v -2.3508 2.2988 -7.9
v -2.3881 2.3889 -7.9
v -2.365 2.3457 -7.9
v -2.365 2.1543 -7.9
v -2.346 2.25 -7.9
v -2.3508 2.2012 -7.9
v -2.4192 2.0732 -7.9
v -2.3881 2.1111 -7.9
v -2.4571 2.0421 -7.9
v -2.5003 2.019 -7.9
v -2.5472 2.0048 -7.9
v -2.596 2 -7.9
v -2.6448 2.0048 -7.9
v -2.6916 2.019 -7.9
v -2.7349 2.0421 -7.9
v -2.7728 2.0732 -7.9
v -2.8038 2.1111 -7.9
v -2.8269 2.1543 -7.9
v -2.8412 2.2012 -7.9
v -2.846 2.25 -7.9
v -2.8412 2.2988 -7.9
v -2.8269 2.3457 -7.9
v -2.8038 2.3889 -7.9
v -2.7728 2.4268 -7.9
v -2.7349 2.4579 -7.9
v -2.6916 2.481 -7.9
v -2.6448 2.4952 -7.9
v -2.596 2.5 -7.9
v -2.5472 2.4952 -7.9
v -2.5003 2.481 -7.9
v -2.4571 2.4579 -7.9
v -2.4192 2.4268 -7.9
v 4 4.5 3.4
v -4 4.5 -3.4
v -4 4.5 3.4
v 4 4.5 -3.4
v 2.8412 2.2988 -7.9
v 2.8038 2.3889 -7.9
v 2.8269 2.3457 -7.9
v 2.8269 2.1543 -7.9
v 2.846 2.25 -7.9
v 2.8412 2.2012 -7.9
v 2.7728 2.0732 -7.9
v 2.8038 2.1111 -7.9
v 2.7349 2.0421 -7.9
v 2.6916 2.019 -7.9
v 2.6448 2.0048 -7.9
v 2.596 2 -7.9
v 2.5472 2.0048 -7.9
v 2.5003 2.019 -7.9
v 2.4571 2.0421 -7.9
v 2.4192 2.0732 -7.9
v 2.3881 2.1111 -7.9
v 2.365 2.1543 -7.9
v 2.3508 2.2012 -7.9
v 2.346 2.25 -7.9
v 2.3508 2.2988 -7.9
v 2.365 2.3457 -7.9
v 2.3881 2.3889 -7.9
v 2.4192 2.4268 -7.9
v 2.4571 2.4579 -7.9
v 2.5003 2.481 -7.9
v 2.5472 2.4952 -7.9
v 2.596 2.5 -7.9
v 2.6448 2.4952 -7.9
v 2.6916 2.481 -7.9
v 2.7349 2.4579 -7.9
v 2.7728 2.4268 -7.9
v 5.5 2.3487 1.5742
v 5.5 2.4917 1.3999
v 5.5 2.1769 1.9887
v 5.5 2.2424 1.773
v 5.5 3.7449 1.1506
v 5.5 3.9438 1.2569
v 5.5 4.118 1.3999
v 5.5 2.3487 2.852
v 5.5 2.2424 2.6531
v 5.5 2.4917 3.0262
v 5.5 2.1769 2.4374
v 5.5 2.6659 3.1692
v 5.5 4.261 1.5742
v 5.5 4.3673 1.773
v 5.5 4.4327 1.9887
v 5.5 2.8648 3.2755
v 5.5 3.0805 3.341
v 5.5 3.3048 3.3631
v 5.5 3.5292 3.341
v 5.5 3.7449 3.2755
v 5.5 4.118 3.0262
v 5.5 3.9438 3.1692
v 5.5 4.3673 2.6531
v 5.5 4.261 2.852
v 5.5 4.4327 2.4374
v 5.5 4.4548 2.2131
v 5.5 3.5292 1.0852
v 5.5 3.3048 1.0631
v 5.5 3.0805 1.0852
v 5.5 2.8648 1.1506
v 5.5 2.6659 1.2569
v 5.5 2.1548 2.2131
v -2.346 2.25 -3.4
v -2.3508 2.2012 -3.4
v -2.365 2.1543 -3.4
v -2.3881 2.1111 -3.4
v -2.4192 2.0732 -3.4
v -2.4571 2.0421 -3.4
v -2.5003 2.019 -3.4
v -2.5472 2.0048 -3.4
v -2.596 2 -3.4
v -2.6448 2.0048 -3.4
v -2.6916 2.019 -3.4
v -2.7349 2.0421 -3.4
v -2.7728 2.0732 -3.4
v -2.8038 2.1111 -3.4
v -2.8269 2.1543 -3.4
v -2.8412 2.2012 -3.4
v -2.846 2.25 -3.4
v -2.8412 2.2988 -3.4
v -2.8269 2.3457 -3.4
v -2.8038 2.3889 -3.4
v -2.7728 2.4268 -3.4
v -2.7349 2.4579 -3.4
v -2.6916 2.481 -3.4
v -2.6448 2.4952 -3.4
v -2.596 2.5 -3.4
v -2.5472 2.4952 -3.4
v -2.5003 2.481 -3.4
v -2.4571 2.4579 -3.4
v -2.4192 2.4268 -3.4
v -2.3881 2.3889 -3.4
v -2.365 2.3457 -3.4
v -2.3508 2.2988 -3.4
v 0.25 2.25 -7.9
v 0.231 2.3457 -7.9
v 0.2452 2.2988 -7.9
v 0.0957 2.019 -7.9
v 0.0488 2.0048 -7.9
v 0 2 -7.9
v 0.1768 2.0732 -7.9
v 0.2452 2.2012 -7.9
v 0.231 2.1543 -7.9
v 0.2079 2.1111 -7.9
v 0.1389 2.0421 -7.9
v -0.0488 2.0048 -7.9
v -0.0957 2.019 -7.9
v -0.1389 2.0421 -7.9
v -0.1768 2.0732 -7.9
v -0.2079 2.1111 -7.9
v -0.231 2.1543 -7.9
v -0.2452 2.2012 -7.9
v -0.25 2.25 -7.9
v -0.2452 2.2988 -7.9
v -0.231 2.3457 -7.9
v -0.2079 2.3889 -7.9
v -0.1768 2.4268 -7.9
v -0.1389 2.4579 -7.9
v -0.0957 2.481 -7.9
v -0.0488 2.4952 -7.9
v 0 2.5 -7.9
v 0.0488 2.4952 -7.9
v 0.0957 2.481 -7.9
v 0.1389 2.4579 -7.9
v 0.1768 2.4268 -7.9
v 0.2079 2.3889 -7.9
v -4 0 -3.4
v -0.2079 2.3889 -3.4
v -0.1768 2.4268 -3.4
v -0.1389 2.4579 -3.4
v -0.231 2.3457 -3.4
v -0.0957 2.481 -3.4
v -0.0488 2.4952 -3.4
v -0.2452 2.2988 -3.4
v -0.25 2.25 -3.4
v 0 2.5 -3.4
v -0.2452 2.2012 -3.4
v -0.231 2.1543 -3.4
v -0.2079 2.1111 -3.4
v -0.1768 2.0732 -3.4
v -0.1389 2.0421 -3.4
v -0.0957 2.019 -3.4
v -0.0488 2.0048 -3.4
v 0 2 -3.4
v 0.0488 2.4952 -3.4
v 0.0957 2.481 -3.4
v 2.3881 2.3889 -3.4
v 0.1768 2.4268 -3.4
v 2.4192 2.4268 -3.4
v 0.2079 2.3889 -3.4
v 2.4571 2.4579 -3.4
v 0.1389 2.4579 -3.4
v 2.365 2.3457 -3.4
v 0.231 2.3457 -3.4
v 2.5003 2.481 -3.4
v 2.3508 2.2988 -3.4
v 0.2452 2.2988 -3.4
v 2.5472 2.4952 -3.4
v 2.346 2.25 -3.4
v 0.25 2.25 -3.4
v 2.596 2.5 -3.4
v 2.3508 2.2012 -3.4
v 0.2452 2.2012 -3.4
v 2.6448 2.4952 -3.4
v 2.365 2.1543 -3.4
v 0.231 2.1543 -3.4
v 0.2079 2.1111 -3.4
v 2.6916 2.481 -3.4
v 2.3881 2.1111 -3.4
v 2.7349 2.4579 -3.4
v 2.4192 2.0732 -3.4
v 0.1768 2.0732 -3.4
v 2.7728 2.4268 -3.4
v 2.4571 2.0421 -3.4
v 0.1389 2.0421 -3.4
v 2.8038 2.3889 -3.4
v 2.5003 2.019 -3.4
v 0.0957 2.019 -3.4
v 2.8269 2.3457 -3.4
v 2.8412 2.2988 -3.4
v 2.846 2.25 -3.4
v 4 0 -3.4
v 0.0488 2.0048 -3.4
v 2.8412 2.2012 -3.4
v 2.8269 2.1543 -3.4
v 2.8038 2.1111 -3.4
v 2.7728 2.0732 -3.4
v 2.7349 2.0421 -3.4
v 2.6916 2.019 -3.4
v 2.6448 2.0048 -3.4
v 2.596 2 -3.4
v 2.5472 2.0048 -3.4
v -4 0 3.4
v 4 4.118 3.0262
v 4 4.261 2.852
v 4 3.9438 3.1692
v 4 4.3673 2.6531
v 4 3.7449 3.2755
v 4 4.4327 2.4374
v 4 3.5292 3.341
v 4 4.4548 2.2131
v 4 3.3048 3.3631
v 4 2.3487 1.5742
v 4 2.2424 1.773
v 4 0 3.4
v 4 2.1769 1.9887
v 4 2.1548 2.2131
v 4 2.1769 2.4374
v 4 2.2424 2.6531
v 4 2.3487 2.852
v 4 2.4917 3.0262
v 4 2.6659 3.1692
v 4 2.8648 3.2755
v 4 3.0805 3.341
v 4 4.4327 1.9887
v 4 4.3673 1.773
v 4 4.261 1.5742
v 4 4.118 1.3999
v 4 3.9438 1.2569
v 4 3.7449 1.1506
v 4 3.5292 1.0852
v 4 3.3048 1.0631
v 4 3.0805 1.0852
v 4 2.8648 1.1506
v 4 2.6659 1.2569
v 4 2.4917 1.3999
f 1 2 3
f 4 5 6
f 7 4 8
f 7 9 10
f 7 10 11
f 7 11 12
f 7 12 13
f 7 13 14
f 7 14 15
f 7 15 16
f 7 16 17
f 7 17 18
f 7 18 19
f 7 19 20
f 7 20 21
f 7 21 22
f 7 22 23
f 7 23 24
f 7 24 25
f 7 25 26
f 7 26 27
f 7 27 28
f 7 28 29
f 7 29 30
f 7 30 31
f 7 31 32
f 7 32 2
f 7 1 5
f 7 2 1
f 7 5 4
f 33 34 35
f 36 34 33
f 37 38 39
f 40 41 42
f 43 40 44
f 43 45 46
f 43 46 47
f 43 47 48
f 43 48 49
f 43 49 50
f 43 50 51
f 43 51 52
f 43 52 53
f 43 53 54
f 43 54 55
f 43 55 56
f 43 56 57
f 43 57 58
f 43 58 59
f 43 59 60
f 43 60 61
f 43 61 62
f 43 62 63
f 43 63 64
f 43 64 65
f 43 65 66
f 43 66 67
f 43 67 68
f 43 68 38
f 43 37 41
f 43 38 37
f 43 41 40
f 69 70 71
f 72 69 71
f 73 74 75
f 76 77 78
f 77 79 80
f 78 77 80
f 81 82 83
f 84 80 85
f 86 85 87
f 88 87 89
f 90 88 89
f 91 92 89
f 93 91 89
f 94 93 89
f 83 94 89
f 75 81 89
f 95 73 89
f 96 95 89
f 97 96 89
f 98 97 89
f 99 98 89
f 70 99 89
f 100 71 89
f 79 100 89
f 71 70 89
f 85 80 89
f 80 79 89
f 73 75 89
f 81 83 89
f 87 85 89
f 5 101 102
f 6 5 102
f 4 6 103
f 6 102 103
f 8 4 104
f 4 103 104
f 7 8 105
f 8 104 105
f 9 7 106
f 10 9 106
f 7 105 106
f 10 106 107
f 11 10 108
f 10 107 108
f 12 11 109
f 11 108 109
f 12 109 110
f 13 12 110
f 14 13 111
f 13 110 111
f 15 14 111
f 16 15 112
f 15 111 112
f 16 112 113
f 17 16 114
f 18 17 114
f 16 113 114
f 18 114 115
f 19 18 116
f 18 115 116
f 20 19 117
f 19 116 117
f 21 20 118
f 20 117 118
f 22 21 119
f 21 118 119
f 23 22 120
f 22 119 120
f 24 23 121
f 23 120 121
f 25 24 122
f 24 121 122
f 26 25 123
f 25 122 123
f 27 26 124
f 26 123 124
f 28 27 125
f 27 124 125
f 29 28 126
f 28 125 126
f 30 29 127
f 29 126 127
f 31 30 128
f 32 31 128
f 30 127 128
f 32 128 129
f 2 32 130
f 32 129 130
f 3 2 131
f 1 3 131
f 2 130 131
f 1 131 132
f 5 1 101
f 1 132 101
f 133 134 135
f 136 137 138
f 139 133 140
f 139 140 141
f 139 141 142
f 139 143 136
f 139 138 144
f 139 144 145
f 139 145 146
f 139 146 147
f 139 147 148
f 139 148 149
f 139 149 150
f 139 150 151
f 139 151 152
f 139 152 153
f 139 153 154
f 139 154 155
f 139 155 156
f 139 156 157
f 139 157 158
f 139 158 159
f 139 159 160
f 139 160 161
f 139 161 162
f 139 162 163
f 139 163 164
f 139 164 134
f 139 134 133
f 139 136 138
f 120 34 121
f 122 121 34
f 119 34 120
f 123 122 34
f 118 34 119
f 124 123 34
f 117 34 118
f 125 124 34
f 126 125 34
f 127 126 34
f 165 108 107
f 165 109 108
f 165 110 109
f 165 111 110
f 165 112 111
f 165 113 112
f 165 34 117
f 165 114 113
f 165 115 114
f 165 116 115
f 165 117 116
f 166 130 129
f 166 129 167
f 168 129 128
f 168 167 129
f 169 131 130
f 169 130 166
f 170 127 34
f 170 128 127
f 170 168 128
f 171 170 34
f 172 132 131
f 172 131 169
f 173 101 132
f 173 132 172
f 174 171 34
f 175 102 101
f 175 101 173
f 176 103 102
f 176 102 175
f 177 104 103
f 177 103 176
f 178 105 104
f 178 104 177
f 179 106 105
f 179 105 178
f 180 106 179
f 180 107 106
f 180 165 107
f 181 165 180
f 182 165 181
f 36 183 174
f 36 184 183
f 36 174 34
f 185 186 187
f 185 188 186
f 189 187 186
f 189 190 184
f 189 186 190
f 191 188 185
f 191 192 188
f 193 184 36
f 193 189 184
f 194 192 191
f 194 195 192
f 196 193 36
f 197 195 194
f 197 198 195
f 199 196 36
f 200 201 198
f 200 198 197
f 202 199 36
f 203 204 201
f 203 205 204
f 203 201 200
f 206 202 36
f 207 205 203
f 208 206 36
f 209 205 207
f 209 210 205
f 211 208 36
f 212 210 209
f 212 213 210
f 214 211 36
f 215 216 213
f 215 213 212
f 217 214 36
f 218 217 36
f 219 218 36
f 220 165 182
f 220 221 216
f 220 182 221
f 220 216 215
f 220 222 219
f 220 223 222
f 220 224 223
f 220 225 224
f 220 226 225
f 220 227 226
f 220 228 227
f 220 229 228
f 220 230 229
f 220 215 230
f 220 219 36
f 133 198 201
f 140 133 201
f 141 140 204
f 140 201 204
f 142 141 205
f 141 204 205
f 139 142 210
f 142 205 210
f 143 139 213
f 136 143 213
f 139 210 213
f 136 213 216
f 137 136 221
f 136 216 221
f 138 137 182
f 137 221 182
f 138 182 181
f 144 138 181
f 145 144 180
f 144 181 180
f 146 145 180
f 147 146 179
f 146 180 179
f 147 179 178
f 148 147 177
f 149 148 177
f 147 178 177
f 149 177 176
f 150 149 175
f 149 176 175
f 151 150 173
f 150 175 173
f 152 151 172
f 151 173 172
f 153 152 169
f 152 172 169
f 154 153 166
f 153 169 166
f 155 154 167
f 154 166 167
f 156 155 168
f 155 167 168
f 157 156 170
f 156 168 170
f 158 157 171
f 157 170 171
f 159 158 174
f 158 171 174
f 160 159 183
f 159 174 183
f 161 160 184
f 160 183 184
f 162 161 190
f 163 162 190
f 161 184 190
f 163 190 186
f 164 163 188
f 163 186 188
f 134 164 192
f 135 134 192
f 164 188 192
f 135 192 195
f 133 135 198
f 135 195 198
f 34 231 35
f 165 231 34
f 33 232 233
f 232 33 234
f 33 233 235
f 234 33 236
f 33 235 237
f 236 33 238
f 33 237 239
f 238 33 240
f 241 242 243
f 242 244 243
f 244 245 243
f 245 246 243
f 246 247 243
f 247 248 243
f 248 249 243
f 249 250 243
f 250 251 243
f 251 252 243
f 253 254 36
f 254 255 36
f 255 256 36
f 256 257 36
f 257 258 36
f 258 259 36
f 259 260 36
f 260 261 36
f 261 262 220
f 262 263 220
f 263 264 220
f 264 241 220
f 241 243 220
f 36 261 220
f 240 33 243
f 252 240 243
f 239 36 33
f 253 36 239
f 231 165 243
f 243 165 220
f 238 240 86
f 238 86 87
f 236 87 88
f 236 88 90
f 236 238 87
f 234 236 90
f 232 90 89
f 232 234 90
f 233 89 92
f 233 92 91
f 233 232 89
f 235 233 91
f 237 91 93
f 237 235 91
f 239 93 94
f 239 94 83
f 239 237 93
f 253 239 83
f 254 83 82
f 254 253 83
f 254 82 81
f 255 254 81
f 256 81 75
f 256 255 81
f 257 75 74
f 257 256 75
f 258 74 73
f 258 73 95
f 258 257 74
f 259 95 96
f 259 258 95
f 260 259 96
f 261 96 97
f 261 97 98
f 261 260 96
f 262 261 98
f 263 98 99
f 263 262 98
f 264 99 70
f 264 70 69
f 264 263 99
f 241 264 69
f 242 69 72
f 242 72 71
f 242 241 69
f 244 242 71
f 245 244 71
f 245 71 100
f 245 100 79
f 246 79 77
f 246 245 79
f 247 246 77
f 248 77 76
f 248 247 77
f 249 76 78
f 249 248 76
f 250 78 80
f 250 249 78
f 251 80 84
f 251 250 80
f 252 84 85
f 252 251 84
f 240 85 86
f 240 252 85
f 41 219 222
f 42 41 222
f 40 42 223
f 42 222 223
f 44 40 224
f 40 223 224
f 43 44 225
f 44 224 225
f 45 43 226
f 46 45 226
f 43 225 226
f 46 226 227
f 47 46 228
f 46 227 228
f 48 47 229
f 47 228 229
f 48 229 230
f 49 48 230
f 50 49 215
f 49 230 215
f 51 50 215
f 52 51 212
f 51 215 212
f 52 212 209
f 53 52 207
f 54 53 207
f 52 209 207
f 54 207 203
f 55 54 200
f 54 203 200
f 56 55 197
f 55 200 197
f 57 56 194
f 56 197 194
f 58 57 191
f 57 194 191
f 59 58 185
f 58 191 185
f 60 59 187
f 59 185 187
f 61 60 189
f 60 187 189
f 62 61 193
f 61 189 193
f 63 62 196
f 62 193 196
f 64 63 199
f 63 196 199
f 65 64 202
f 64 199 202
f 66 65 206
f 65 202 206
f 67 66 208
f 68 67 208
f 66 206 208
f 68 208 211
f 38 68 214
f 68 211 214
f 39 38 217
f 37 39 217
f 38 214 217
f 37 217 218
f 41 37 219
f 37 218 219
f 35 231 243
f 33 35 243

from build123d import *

# Parameters (mm, degrees)
SKETCH_1_W      = 8
SKETCH_1_H      = 6.8
EXTRUDE_1_DEPTH = 4.5
SKETCH_3_R      = 0.25
EXTRUDE_3_DEPTH = 4.5
SKETCH_4_R      = 1.15
EXTRUDE_4_DEPTH = 1.5


with BuildPart() as part:
    # 草图1 → 拉伸1 (new body)
    with BuildSketch(Plane(origin=(0, 0, 0), x_dir=(1, 0, 0), z_dir=(0, 1, 0))):
        Rectangle(SKETCH_1_W, SKETCH_1_H)
    extrude(amount=EXTRUDE_1_DEPTH)

    # 草图3 → 拉伸3 (add)
    with BuildSketch(Plane(origin=(0, 0, -3.4), x_dir=(-1, 0, 0), z_dir=(0, 0, -1))):
        with Locations(Location((0, 2.25, 0), (0, 0, 180))):
            Circle(SKETCH_3_R)
        with Locations(Location((2.595978382, 2.25, 0), (0, 0, 180))):
            Circle(SKETCH_3_R)
        with Locations(Location((-2.595978382, 2.25, 0), (0, 0, 180))):
            Circle(SKETCH_3_R)
    extrude(amount=EXTRUDE_3_DEPTH)

    # 草图4 → 拉伸4 (add)
    with BuildSketch(Plane(origin=(4, 0, -0.6), x_dir=(0, 0, 1), z_dir=(-1, 0, 0))):
        with Locations((2.813059067, 3.304845193)):
            Circle(SKETCH_4_R)
    extrude(amount=-EXTRUDE_4_DEPTH)


solid = part.part
